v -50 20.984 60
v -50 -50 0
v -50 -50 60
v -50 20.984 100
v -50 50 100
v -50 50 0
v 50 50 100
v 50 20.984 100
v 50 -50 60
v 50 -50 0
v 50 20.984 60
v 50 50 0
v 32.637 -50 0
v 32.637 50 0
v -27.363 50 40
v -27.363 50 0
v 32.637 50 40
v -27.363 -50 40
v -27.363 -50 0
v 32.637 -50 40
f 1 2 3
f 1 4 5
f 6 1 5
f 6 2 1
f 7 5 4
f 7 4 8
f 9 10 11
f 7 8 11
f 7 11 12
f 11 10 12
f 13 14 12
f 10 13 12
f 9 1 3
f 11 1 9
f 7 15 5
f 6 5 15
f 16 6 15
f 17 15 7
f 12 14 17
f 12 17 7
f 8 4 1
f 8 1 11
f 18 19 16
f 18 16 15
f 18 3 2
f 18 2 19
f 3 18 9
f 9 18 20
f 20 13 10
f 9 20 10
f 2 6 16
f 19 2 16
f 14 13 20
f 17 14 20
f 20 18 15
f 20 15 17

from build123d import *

# Parameters (mm, degrees)
F0_W     = 100
F0_H     = 100
F1_DEPTH = 100
F2_W     = 100
F2_H     = 70.984376
F3_DEPTH = 40
F4_W     = 60
F4_H     = 40
F5_DEPTH = 100


with BuildPart() as f1:
    # F0 (on Top) → F1 (new body)
    with BuildSketch(Plane.XY):
        Rectangle(F0_W, F0_H)
    extrude(amount=F1_DEPTH)

    # F2 (on face) → F3 (cut)
    with BuildSketch(Plane.XY.offset(100)):
        with Locations((0, -14.507812)):
            Rectangle(F2_W, F2_H)
    extrude(amount=-F3_DEPTH, mode=Mode.SUBTRACT)

    # F4 (on face) → F5 (cut)
    with BuildSketch(Plane.XZ.offset(50)):
        with Locations((2.63708, 20)):
            Rectangle(F4_W, F4_H)
    extrude(amount=-F5_DEPTH, mode=Mode.SUBTRACT)


solid = f1.part
